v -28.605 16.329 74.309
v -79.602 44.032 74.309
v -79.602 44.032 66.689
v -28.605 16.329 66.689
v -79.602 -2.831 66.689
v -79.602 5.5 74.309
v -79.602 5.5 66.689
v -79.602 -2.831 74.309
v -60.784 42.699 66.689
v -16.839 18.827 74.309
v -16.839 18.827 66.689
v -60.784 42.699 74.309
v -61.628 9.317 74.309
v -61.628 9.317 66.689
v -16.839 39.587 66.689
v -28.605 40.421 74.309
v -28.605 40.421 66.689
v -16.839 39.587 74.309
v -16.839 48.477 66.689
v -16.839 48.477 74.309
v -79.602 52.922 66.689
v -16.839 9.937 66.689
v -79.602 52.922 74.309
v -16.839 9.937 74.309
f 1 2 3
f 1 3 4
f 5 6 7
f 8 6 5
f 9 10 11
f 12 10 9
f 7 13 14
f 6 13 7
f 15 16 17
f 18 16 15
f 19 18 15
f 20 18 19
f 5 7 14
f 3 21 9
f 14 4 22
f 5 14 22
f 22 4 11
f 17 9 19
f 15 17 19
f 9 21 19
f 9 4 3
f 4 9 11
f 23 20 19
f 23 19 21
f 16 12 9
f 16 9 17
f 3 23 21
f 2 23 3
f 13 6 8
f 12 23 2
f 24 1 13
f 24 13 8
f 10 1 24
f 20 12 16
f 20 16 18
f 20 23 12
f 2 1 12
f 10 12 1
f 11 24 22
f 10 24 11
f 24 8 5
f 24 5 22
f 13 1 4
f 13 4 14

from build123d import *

# Parameters (mm, degrees)
BOSS_EXTRUDE1_DEPTH = 7.62


with BuildPart() as part:
    # Sketch1 → Boss-Extrude1 (new body)
    with BuildSketch(Plane.XY.offset(74.309059093)):
        Polygon((-16.83862503, 48.477236207), (-79.60202503, 52.922236207), (-79.60202503, 44.032236207), (-28.604506433, 16.328823125), (-61.627708465, 9.316547792), (-79.60202503, 5.499811409), (-79.60202503, -2.831388591), (-16.83862503, 9.937236207), (-16.83862503, 18.827236207), (-60.783589078, 42.699485785), (-28.604506433, 40.420513926), (-16.83862503, 39.587236207), align=None)
    extrude(amount=-BOSS_EXTRUDE1_DEPTH)


solid = part.part
